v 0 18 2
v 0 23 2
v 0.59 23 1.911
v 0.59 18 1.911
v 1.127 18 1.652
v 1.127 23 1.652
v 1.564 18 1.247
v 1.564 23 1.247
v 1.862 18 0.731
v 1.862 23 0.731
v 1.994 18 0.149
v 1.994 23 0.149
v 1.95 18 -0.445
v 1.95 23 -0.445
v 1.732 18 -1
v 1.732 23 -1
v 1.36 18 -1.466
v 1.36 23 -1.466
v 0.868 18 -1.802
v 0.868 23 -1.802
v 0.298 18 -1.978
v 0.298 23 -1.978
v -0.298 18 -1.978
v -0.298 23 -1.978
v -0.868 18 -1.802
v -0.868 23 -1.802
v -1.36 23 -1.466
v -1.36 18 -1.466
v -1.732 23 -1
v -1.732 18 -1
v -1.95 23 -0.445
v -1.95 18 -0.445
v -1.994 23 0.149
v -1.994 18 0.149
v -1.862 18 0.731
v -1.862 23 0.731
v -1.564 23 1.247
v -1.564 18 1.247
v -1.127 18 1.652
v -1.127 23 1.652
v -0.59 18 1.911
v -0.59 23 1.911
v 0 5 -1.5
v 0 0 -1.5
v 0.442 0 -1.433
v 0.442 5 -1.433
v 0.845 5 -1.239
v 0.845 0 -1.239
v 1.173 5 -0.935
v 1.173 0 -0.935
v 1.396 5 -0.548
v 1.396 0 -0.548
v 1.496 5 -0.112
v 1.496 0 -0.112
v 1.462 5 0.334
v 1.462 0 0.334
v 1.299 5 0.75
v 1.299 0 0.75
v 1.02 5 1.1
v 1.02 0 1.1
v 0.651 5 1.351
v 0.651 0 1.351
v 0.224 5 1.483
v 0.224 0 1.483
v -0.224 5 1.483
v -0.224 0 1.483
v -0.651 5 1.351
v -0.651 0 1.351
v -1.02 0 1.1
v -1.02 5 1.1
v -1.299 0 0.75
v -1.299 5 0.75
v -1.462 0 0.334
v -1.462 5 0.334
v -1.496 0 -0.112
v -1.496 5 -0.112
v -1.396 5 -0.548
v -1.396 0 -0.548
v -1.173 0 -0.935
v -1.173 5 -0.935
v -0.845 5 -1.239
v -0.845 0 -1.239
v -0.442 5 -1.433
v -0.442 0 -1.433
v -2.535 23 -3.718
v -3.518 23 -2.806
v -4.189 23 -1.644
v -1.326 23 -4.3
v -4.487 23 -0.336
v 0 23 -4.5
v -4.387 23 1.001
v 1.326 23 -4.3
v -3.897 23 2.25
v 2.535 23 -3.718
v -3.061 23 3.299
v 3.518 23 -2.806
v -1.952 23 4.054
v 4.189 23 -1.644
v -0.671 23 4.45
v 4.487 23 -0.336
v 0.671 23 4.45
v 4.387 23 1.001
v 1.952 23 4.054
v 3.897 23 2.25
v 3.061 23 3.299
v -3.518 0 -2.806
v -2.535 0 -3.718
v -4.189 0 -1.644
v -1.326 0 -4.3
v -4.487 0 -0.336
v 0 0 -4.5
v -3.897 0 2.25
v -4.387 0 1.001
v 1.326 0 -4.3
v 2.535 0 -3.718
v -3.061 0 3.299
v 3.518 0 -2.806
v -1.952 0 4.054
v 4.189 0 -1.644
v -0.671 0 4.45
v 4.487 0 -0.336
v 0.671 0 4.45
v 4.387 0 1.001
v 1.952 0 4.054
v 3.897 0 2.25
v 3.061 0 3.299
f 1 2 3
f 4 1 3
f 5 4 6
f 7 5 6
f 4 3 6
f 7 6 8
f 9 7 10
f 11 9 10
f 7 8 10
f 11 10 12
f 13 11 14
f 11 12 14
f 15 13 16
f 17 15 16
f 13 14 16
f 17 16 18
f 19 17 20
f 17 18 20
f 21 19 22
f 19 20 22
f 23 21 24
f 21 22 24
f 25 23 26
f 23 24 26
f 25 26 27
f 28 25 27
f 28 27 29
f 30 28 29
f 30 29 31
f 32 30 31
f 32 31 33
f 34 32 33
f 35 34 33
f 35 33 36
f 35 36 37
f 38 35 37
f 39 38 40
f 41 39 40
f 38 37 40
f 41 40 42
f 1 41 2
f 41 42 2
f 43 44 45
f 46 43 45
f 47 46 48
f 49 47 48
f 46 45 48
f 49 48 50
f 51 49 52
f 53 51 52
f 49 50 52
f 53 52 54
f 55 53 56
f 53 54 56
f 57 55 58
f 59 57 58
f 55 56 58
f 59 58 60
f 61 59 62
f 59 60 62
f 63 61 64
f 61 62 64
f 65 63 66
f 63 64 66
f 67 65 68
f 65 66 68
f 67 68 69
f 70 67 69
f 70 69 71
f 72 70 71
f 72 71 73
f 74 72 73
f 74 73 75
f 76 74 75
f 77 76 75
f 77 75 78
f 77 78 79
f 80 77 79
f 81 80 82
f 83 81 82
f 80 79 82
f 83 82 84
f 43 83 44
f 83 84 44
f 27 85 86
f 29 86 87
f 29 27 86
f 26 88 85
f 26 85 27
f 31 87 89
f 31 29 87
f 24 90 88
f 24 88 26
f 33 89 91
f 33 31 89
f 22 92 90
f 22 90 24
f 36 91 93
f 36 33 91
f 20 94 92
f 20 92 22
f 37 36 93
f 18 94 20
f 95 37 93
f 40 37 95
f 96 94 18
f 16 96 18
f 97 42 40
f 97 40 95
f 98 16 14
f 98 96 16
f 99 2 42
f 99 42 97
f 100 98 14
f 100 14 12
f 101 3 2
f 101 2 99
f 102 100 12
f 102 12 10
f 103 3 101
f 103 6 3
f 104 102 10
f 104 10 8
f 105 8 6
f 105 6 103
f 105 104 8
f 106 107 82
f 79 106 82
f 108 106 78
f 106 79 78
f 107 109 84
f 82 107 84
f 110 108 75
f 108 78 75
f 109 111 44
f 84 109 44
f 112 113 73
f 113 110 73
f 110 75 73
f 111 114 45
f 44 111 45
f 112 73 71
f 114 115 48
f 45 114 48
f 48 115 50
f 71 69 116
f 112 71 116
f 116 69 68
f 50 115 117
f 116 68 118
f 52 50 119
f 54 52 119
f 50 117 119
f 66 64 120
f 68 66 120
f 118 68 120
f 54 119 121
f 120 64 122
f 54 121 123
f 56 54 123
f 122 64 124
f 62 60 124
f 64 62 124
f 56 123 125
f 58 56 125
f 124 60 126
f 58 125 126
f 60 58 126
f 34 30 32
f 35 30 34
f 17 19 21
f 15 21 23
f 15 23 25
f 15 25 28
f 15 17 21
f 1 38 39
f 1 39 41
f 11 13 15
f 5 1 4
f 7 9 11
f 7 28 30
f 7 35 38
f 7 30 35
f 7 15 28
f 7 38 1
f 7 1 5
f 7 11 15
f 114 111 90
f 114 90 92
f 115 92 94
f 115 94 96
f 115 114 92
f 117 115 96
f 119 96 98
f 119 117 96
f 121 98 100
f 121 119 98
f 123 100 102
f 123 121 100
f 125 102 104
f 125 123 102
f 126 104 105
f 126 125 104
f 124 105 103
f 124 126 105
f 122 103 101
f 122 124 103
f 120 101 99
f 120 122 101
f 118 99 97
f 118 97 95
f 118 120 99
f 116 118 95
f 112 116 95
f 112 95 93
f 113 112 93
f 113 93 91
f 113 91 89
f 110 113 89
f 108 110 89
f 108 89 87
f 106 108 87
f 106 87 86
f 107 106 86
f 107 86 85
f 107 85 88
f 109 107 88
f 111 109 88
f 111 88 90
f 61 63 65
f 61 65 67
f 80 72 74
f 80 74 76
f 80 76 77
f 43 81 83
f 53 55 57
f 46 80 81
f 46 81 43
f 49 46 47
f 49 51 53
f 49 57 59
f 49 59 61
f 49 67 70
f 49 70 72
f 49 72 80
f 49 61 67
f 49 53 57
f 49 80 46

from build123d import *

# Parameters (mm, degrees)
ESQUISSE1_R             = 9
BOSS_EXTRU_1_DEPTH      = 23
ESQUISSE2_R             = 9
ESQUISSE2_R_2           = 4.5
ENL_V_MAT_EXTRU_2_DEPTH = 27.286878856
ESQUISSE3_R             = 1.5
ENL_V_MAT_EXTRU_3_DEPTH = 5
ESQUISSE4_R             = 2
ENL_V_MAT_EXTRU_4_DEPTH = 5


with BuildPart() as part:
    # Esquisse1 → Boss.-Extru.1 (new body)
    with BuildSketch(Plane(origin=(0, 0, 0), x_dir=(1, 0, 0), z_dir=(0, 1, 0))):
        with Locations(Location((0, 0, 0), (0, 0, 270))):
            Circle(ESQUISSE1_R)
    extrude(amount=BOSS_EXTRU_1_DEPTH)

    # Esquisse2 → Enlèv. mat.-Extru.2 (cut, through all)
    with BuildSketch(Plane(origin=(0, 0, 0), x_dir=(-1, 0, 0), z_dir=(0, -1, 0))):
        Circle(ESQUISSE2_R)
        with Locations(Location((0, 0, 0), (0, 0, 90))):
            Circle(ESQUISSE2_R_2, mode=Mode.SUBTRACT)
    extrude(amount=-ENL_V_MAT_EXTRU_2_DEPTH, mode=Mode.SUBTRACT)

    # Esquisse3 → Enlèv. mat.-Extru.3 (cut)
    with BuildSketch(Plane(origin=(0, 0, 0), x_dir=(-1, 0, 0), z_dir=(0, -1, 0))):
        with Locations(Location((0, 0, 0), (0, 0, 90))):
            Circle(ESQUISSE3_R)
    extrude(amount=-ENL_V_MAT_EXTRU_3_DEPTH, mode=Mode.SUBTRACT)

    # Esquisse4 → Enlèv. mat.-Extru.4 (cut)
    with BuildSketch(Plane(origin=(0, 23, 0), x_dir=(1, 0, 0), z_dir=(0, 1, 0))):
        with Locations(Location((0, 0, 0), (0, 0, 270))):
            Circle(ESQUISSE4_R)
    extrude(amount=-ENL_V_MAT_EXTRU_4_DEPTH, mode=Mode.SUBTRACT)


solid = part.part
